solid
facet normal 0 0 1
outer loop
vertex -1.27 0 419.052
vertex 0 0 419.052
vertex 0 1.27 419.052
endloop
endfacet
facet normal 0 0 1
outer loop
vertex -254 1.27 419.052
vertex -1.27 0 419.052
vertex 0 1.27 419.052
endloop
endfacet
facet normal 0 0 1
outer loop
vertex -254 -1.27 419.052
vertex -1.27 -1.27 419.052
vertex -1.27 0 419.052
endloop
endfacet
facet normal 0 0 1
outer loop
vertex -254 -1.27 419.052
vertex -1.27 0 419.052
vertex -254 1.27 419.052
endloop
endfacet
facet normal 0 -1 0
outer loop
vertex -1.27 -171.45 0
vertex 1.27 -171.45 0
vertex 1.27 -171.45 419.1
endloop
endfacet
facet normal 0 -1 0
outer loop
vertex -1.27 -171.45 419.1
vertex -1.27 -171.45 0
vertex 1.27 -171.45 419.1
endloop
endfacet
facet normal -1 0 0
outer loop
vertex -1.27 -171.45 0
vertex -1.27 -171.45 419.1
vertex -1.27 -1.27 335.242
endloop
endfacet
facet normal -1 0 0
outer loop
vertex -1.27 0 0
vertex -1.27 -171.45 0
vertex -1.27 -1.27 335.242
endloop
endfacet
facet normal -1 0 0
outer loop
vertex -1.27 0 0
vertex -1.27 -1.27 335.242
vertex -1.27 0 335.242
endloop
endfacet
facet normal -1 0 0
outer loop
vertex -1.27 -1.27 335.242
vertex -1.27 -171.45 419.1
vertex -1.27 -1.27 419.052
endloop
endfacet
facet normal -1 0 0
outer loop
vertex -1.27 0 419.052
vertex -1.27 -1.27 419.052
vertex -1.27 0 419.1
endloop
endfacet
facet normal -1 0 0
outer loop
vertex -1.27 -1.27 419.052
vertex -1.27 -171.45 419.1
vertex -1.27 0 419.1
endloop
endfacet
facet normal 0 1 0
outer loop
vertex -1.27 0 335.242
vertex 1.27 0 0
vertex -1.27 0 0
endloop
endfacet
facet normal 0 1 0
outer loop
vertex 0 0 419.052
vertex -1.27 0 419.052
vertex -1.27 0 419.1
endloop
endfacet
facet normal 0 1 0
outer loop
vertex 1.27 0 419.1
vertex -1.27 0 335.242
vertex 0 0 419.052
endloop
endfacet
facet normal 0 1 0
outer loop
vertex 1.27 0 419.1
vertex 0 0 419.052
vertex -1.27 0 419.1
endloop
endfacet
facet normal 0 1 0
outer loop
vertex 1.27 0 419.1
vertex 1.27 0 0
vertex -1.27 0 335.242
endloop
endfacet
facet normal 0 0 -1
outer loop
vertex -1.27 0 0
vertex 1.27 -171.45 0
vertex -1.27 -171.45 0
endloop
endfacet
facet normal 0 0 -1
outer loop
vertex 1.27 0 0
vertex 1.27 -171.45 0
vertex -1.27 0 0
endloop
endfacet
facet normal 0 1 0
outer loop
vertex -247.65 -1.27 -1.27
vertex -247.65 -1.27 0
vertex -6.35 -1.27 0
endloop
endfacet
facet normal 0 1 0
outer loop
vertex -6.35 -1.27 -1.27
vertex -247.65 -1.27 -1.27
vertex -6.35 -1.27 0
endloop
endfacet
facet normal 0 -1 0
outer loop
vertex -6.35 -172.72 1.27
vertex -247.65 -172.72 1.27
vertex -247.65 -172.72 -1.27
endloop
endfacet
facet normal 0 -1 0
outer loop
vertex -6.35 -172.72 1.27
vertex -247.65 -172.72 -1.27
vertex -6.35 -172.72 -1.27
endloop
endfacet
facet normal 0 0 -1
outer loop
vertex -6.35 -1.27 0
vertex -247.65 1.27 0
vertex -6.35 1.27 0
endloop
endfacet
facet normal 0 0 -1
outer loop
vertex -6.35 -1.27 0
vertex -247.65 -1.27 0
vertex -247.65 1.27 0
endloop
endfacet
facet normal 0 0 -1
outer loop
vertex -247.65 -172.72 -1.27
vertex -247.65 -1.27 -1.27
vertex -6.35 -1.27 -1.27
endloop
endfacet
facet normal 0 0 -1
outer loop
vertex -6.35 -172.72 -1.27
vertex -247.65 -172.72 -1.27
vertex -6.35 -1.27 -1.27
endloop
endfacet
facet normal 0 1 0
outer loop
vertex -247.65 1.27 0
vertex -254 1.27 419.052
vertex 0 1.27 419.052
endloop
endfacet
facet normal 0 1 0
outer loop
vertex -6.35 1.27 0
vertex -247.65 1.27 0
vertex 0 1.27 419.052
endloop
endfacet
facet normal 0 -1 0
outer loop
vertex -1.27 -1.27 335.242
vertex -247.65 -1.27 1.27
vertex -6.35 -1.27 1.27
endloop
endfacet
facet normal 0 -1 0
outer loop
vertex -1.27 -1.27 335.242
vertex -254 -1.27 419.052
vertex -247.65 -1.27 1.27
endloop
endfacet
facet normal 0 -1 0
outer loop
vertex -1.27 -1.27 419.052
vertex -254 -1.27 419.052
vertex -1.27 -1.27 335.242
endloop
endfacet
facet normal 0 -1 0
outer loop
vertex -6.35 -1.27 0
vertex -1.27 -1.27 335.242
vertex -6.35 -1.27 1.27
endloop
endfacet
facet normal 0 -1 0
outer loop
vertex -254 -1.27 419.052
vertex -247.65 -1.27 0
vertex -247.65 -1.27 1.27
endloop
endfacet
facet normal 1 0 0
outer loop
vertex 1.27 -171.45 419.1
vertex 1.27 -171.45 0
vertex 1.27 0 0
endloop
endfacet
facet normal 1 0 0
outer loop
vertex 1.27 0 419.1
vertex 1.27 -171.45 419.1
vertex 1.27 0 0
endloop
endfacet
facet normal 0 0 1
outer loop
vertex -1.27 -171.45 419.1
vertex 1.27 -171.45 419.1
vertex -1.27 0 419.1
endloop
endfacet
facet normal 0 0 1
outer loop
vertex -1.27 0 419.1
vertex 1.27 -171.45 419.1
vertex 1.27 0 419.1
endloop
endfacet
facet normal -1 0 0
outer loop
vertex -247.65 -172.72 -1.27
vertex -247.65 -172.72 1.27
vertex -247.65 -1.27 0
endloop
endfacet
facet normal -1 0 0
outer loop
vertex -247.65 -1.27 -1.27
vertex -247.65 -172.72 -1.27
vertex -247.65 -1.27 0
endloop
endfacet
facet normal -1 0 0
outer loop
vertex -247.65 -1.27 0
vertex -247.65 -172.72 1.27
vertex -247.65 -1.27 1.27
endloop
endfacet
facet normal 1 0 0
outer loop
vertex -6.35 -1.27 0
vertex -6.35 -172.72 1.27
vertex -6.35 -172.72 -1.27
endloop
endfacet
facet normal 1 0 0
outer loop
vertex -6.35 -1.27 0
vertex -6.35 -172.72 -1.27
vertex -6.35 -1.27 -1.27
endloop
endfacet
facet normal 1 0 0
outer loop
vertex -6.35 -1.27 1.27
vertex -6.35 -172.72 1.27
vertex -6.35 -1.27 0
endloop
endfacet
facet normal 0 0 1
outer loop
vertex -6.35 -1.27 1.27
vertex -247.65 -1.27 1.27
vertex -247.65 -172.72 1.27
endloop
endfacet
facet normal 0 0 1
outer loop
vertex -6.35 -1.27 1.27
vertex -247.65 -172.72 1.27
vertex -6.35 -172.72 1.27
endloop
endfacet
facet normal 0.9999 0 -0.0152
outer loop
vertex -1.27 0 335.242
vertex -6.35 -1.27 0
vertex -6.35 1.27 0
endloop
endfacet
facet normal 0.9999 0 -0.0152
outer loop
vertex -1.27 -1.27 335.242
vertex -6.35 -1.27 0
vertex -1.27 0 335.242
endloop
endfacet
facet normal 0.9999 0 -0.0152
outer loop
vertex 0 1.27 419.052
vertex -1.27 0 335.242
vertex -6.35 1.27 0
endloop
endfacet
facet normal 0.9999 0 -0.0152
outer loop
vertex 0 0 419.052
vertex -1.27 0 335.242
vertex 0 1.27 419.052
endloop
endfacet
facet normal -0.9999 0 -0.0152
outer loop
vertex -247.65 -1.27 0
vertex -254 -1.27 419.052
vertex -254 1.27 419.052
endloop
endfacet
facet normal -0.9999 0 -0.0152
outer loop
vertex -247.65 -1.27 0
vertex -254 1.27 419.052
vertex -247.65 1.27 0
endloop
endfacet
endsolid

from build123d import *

# Parameters (mm, degrees)
F1_DEPTH = 1.27
F2_W     = 241.3
F2_H     = 171.45
F3_DEPTH = 1.27
F4_W     = 171.45
F4_H     = 419.1
F5_DEPTH = 1.27


with BuildPart() as f1:
    # F0 (on Front) → F1 (new body, symmetric)
    with BuildSketch(Plane.XZ):
        Polygon((-6.35, 0), (0, 419.051891), (-254, 419.051891), (-247.65, 0), align=None)
    extrude(amount=F1_DEPTH, both=True)

    # F2 (on Top) → F3 (join, symmetric)
    with BuildSketch(Plane.XY):
        with Locations((-127, -86.995)):
            Rectangle(F2_W, F2_H)
    extrude(amount=F3_DEPTH, both=True)

    # F4 (on Right) → F5 (join, symmetric)
    with BuildSketch(Plane.YZ):
        with Locations((-85.725, 209.55)):
            Rectangle(F4_W, F4_H)
    extrude(amount=F5_DEPTH, both=True)


solid = f1.part
